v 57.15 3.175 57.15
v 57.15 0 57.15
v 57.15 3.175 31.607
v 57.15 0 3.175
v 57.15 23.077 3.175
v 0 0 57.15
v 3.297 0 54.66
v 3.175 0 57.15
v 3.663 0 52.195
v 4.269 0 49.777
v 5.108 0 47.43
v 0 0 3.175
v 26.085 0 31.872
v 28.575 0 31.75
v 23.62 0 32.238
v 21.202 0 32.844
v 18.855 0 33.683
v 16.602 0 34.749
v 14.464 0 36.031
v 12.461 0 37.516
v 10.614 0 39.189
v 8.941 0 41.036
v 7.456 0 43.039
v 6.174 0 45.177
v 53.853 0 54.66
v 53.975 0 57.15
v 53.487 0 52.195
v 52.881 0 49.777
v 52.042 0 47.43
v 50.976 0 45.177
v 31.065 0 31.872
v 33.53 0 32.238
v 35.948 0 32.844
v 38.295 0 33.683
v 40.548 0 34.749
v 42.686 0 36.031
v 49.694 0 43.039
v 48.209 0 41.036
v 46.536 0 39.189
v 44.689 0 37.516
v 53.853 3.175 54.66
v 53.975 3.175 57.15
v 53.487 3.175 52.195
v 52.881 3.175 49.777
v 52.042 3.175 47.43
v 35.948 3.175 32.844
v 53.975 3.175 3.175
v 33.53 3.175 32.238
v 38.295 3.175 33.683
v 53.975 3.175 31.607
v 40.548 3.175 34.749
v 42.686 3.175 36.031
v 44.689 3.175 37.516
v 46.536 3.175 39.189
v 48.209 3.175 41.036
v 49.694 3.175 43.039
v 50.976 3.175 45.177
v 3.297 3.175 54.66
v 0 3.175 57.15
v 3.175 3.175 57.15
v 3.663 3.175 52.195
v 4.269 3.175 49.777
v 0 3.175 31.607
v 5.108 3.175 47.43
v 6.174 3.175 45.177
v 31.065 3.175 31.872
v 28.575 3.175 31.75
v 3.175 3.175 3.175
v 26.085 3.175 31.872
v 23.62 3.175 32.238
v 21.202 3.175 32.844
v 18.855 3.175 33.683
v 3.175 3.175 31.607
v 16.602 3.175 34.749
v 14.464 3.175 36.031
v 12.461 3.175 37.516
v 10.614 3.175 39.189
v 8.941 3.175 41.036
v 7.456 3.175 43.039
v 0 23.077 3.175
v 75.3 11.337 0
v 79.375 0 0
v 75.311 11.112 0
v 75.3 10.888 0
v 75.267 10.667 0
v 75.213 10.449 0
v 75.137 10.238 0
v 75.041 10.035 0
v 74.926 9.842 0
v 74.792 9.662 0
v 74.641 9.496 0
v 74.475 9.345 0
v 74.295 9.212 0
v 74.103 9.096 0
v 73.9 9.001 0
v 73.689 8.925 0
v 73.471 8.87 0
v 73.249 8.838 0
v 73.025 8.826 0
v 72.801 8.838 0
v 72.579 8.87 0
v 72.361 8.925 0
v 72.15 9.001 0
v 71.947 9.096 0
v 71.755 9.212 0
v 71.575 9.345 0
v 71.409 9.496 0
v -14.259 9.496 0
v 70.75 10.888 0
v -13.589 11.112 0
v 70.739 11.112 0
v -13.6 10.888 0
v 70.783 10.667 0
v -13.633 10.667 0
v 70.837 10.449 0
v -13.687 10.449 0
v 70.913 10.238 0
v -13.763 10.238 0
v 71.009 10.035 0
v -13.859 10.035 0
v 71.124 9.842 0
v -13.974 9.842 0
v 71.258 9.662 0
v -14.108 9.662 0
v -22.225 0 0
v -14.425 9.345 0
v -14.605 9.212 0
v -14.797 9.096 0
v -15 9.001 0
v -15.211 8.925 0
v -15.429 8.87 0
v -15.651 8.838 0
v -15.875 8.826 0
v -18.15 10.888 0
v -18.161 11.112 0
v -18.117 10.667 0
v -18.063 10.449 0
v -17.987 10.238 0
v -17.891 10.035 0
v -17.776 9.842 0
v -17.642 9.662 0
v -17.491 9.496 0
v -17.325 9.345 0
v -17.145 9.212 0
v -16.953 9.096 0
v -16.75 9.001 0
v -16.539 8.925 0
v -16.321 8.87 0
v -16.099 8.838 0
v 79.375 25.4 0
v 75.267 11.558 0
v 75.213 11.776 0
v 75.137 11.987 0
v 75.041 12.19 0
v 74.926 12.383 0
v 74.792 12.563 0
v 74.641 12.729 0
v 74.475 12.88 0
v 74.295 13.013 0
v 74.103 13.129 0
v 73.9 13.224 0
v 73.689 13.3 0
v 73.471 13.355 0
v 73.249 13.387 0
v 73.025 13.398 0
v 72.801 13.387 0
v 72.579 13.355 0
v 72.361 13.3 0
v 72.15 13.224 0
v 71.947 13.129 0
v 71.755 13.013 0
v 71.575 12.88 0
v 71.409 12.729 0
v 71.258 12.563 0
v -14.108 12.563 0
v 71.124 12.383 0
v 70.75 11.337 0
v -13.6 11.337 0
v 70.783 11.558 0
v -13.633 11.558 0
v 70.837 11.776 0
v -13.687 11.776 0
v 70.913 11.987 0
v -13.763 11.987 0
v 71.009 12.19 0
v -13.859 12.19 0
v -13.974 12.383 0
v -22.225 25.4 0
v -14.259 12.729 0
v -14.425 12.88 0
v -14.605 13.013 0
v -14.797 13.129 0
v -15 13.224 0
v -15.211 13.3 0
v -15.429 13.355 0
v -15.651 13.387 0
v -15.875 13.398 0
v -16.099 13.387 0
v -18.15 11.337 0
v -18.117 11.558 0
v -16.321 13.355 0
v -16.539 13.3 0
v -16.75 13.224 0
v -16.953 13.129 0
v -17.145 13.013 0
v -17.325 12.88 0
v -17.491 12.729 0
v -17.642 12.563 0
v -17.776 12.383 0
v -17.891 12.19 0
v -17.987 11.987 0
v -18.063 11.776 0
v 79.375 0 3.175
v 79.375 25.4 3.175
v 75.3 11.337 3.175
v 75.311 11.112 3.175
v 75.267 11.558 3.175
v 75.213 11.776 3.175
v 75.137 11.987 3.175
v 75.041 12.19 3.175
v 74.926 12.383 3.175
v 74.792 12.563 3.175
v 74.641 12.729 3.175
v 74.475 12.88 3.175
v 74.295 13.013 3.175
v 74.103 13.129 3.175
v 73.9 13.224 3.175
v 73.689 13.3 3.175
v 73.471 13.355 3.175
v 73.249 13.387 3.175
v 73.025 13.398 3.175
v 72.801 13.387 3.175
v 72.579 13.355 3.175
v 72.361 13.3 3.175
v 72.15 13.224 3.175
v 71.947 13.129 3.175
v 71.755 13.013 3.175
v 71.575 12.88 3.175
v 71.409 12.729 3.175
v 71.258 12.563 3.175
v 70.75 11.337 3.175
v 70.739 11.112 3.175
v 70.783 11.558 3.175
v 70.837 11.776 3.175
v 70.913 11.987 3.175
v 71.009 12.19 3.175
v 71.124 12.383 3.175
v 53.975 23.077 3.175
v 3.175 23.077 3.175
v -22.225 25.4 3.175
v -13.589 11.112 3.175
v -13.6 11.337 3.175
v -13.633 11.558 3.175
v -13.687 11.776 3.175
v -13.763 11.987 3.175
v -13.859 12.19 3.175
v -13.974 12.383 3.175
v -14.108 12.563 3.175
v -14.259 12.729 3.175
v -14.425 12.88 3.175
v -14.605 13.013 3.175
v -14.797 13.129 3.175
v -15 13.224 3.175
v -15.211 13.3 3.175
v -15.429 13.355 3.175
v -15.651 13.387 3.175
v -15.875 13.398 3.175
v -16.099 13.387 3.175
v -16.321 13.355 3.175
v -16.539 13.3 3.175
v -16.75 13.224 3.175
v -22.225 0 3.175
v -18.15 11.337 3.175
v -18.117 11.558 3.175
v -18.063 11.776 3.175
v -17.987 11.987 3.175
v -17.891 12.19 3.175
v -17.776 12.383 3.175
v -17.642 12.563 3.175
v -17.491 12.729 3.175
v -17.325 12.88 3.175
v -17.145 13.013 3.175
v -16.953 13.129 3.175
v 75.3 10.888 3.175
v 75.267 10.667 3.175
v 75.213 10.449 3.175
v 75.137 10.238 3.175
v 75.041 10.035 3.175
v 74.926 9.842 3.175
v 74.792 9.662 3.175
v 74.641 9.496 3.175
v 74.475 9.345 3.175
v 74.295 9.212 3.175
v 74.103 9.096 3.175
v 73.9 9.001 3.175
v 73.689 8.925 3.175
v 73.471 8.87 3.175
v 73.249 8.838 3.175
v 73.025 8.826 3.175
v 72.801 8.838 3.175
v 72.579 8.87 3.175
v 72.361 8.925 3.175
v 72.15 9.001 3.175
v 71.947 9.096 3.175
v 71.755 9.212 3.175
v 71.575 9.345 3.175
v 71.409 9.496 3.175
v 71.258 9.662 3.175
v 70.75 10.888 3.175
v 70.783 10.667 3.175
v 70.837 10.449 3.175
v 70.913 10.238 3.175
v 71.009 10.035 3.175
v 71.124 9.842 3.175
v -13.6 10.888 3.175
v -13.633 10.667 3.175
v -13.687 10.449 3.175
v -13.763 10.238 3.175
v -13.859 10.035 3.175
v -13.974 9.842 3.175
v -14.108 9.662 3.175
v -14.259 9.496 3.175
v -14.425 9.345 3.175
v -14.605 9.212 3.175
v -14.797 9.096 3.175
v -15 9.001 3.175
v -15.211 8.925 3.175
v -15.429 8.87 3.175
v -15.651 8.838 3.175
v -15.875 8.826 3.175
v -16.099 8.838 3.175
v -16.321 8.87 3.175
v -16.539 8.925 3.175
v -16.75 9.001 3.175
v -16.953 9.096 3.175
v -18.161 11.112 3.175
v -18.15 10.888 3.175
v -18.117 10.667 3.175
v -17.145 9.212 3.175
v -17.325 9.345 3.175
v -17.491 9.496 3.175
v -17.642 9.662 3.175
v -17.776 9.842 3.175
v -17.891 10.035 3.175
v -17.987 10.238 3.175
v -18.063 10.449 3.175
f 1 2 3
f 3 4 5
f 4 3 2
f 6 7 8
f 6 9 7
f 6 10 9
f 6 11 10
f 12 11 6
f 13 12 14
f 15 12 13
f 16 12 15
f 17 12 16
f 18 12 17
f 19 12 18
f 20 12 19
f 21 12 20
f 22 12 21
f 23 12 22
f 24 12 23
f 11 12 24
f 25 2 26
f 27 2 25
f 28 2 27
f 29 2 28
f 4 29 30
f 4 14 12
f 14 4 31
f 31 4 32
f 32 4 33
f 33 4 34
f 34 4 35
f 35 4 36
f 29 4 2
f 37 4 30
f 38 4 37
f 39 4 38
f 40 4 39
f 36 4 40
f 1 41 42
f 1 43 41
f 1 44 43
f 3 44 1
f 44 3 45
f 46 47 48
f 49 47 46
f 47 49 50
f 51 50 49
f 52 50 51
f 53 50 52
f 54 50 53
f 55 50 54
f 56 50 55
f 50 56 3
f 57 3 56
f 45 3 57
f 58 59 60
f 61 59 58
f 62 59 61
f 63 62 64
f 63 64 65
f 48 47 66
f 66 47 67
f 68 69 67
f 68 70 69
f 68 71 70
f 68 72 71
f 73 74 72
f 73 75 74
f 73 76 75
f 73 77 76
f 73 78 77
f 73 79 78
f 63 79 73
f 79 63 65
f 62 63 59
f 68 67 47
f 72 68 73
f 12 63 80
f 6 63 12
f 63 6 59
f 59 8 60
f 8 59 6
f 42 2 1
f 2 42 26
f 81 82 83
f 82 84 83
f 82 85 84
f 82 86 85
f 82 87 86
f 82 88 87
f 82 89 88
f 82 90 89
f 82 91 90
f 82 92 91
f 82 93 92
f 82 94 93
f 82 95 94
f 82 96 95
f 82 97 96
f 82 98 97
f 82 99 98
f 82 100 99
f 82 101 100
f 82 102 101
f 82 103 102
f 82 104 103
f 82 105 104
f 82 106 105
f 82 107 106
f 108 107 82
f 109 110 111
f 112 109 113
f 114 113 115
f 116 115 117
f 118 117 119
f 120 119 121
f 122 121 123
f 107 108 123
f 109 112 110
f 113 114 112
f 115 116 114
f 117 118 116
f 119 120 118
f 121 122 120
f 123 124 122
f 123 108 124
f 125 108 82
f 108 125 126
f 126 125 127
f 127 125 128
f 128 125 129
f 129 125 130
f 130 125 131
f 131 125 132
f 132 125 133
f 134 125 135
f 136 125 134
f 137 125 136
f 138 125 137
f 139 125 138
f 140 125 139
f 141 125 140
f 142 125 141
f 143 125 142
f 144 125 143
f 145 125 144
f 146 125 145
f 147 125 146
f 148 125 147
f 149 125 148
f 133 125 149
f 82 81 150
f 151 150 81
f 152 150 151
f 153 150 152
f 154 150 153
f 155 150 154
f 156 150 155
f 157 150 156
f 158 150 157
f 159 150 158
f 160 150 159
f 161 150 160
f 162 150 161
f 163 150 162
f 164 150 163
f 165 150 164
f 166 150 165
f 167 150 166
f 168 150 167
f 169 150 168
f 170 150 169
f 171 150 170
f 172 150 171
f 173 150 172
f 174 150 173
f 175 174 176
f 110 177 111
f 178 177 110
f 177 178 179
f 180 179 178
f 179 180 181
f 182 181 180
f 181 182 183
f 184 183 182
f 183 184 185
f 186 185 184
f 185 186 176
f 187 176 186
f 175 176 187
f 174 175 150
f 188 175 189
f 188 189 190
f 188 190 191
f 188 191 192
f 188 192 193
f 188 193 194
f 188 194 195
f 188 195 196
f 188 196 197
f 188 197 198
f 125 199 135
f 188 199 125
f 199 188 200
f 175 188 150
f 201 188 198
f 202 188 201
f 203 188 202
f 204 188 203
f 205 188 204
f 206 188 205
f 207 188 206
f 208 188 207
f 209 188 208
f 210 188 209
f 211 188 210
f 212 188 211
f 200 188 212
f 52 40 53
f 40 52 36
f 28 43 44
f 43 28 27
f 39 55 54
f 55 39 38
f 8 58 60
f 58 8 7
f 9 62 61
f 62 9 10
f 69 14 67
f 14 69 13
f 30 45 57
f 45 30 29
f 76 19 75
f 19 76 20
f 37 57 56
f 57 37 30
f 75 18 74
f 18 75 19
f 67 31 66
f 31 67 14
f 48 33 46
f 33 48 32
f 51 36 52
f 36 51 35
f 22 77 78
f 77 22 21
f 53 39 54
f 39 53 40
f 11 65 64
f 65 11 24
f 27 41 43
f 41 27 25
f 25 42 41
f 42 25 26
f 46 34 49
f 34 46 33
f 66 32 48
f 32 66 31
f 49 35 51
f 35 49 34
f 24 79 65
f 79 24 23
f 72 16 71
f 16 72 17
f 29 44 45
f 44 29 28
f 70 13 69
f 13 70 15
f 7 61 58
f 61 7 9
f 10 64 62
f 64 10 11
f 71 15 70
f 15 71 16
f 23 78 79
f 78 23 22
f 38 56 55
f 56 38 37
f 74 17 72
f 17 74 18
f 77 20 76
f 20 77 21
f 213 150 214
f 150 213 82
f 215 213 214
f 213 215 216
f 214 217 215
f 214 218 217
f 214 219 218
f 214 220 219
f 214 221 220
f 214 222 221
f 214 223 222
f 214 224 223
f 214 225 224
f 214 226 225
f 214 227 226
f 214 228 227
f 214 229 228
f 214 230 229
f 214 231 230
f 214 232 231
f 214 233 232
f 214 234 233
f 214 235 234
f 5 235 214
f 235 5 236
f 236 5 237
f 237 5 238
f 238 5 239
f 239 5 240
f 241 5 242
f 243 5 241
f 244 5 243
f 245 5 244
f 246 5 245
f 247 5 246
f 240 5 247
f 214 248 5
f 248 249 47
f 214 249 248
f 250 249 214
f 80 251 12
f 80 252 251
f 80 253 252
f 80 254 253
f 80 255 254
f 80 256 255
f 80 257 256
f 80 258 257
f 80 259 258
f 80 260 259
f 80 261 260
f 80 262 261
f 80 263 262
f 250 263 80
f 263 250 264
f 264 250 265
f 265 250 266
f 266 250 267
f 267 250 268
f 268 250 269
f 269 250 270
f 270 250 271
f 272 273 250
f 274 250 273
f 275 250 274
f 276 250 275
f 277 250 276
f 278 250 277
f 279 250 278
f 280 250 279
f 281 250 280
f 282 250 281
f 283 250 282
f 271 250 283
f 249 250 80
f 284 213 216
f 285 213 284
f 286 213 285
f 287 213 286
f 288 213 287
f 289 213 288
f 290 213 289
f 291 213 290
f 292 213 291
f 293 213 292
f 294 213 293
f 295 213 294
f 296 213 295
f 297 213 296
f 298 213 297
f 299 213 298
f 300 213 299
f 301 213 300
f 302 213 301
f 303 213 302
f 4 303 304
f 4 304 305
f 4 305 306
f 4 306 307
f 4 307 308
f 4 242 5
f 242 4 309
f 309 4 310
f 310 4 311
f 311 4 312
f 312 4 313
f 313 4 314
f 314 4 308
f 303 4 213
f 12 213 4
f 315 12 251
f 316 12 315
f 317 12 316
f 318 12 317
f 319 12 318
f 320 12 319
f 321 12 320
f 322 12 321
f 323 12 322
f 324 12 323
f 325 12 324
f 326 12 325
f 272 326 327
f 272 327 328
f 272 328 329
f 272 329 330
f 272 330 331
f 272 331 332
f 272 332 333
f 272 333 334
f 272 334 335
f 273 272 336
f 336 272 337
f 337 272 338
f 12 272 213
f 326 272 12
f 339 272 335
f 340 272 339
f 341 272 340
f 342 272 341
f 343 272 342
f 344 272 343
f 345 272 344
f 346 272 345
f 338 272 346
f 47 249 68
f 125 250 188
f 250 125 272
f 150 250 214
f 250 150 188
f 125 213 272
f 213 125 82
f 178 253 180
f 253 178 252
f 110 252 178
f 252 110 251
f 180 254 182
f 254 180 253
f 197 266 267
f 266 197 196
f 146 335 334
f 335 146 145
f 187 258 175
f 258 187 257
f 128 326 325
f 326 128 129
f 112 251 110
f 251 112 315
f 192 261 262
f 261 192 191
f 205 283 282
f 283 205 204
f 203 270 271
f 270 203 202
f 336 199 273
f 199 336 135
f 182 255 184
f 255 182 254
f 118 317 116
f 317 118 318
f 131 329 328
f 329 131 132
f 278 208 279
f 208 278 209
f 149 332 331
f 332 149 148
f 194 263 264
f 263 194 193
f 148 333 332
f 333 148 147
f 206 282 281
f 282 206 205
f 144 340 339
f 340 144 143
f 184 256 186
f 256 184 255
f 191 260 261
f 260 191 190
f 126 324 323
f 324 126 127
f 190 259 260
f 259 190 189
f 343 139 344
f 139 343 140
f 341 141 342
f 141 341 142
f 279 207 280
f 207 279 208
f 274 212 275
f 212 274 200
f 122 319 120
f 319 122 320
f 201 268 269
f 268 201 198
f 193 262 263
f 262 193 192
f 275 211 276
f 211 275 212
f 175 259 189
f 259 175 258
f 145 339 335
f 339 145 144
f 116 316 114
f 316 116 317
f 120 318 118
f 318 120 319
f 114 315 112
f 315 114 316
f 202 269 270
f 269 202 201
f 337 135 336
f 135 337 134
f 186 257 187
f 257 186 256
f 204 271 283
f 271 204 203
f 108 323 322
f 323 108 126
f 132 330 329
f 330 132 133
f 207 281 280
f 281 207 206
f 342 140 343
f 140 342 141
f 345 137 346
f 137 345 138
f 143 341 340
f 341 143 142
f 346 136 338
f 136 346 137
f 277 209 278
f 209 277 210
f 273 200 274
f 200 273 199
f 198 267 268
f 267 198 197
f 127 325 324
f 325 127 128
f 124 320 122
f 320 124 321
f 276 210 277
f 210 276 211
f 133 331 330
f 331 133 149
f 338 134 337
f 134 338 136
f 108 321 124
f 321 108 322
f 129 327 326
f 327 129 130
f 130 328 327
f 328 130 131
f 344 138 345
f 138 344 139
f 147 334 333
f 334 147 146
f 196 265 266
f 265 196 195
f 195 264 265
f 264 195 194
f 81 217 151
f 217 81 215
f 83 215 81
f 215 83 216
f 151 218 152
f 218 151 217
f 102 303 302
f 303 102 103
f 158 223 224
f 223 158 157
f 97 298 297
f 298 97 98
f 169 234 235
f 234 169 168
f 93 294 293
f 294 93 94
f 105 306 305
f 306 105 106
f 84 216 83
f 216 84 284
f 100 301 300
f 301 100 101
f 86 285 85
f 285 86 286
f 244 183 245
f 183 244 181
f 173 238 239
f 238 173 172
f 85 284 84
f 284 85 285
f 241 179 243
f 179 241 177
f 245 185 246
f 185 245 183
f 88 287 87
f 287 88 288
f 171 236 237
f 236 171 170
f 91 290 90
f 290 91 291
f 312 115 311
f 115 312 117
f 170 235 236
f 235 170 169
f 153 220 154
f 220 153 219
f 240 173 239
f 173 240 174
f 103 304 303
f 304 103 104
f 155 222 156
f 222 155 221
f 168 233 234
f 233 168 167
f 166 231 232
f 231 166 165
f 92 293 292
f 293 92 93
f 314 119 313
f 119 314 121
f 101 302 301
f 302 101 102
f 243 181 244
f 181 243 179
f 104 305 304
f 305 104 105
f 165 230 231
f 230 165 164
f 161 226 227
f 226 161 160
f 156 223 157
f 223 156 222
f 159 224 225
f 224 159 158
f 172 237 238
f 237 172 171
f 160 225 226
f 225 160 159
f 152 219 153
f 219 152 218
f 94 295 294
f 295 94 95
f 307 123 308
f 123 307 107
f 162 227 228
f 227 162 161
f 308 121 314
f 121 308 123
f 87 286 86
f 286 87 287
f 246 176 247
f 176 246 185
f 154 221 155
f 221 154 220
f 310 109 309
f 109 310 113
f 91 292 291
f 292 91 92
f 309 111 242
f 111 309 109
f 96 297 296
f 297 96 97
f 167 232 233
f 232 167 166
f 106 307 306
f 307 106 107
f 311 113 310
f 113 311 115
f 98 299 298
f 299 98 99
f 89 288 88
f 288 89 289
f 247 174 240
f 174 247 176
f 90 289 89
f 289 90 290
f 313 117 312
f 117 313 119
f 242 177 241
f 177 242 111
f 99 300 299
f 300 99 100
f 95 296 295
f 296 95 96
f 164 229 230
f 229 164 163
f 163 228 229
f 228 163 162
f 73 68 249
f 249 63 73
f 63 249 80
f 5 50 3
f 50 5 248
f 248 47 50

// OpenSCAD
//
// CRT support
//
// CRT neck support 2" dia
// Height 1.25 inch above base
// 4 inch width for base
//

$fn=64;
e=0.1;

function mm(x)=x*25.4;

module hole_at(x,y,dia) {
     translate( [x, y, -e])
	  cylinder( h=thk+2*e, d=dia);
}

crt_dia = mm(2.0);
crt_hgt = mm(1.25);

sup_hgt = mm(1);
sup_wid = crt_dia+mm(0.25);

thk = mm(0.125);

base_wid = mm(4);
base_len = mm(1);

hole_dia = mm(0.18);
hole_off = mm(0.25);

module sup() {
     difference() {
	  cube( [sup_wid, crt_hgt+sup_hgt, thk]);
	  translate( [sup_wid/2, crt_hgt+crt_dia/2, -e])
	       cylinder( h=thk+2*e, d=crt_dia);
     }
}

module base() {
     difference() {
	  cube( [base_wid, base_len, thk]);
	  hole_at( hole_off, (base_len-thk)/2, hole_dia);
	  hole_at( base_wid-hole_off, (base_len-thk)/2, hole_dia);
     }
}

module side() {
     linear_extrude( height=thk) {
	  polygon( points = [[0,0], [0, base_len-thk], [crt_hgt, 0]]);
     }
}


translate( [0, thk, 0]) rotate( [90, 0, 0]) sup();
translate( [ -(base_wid-sup_wid)/2, 0, 0])
base();
translate( [thk, thk-e, 0]) rotate( [0, -90, 0]) side();
translate( [sup_wid, thk-e, 0]) rotate( [0, -90, 0]) side();
